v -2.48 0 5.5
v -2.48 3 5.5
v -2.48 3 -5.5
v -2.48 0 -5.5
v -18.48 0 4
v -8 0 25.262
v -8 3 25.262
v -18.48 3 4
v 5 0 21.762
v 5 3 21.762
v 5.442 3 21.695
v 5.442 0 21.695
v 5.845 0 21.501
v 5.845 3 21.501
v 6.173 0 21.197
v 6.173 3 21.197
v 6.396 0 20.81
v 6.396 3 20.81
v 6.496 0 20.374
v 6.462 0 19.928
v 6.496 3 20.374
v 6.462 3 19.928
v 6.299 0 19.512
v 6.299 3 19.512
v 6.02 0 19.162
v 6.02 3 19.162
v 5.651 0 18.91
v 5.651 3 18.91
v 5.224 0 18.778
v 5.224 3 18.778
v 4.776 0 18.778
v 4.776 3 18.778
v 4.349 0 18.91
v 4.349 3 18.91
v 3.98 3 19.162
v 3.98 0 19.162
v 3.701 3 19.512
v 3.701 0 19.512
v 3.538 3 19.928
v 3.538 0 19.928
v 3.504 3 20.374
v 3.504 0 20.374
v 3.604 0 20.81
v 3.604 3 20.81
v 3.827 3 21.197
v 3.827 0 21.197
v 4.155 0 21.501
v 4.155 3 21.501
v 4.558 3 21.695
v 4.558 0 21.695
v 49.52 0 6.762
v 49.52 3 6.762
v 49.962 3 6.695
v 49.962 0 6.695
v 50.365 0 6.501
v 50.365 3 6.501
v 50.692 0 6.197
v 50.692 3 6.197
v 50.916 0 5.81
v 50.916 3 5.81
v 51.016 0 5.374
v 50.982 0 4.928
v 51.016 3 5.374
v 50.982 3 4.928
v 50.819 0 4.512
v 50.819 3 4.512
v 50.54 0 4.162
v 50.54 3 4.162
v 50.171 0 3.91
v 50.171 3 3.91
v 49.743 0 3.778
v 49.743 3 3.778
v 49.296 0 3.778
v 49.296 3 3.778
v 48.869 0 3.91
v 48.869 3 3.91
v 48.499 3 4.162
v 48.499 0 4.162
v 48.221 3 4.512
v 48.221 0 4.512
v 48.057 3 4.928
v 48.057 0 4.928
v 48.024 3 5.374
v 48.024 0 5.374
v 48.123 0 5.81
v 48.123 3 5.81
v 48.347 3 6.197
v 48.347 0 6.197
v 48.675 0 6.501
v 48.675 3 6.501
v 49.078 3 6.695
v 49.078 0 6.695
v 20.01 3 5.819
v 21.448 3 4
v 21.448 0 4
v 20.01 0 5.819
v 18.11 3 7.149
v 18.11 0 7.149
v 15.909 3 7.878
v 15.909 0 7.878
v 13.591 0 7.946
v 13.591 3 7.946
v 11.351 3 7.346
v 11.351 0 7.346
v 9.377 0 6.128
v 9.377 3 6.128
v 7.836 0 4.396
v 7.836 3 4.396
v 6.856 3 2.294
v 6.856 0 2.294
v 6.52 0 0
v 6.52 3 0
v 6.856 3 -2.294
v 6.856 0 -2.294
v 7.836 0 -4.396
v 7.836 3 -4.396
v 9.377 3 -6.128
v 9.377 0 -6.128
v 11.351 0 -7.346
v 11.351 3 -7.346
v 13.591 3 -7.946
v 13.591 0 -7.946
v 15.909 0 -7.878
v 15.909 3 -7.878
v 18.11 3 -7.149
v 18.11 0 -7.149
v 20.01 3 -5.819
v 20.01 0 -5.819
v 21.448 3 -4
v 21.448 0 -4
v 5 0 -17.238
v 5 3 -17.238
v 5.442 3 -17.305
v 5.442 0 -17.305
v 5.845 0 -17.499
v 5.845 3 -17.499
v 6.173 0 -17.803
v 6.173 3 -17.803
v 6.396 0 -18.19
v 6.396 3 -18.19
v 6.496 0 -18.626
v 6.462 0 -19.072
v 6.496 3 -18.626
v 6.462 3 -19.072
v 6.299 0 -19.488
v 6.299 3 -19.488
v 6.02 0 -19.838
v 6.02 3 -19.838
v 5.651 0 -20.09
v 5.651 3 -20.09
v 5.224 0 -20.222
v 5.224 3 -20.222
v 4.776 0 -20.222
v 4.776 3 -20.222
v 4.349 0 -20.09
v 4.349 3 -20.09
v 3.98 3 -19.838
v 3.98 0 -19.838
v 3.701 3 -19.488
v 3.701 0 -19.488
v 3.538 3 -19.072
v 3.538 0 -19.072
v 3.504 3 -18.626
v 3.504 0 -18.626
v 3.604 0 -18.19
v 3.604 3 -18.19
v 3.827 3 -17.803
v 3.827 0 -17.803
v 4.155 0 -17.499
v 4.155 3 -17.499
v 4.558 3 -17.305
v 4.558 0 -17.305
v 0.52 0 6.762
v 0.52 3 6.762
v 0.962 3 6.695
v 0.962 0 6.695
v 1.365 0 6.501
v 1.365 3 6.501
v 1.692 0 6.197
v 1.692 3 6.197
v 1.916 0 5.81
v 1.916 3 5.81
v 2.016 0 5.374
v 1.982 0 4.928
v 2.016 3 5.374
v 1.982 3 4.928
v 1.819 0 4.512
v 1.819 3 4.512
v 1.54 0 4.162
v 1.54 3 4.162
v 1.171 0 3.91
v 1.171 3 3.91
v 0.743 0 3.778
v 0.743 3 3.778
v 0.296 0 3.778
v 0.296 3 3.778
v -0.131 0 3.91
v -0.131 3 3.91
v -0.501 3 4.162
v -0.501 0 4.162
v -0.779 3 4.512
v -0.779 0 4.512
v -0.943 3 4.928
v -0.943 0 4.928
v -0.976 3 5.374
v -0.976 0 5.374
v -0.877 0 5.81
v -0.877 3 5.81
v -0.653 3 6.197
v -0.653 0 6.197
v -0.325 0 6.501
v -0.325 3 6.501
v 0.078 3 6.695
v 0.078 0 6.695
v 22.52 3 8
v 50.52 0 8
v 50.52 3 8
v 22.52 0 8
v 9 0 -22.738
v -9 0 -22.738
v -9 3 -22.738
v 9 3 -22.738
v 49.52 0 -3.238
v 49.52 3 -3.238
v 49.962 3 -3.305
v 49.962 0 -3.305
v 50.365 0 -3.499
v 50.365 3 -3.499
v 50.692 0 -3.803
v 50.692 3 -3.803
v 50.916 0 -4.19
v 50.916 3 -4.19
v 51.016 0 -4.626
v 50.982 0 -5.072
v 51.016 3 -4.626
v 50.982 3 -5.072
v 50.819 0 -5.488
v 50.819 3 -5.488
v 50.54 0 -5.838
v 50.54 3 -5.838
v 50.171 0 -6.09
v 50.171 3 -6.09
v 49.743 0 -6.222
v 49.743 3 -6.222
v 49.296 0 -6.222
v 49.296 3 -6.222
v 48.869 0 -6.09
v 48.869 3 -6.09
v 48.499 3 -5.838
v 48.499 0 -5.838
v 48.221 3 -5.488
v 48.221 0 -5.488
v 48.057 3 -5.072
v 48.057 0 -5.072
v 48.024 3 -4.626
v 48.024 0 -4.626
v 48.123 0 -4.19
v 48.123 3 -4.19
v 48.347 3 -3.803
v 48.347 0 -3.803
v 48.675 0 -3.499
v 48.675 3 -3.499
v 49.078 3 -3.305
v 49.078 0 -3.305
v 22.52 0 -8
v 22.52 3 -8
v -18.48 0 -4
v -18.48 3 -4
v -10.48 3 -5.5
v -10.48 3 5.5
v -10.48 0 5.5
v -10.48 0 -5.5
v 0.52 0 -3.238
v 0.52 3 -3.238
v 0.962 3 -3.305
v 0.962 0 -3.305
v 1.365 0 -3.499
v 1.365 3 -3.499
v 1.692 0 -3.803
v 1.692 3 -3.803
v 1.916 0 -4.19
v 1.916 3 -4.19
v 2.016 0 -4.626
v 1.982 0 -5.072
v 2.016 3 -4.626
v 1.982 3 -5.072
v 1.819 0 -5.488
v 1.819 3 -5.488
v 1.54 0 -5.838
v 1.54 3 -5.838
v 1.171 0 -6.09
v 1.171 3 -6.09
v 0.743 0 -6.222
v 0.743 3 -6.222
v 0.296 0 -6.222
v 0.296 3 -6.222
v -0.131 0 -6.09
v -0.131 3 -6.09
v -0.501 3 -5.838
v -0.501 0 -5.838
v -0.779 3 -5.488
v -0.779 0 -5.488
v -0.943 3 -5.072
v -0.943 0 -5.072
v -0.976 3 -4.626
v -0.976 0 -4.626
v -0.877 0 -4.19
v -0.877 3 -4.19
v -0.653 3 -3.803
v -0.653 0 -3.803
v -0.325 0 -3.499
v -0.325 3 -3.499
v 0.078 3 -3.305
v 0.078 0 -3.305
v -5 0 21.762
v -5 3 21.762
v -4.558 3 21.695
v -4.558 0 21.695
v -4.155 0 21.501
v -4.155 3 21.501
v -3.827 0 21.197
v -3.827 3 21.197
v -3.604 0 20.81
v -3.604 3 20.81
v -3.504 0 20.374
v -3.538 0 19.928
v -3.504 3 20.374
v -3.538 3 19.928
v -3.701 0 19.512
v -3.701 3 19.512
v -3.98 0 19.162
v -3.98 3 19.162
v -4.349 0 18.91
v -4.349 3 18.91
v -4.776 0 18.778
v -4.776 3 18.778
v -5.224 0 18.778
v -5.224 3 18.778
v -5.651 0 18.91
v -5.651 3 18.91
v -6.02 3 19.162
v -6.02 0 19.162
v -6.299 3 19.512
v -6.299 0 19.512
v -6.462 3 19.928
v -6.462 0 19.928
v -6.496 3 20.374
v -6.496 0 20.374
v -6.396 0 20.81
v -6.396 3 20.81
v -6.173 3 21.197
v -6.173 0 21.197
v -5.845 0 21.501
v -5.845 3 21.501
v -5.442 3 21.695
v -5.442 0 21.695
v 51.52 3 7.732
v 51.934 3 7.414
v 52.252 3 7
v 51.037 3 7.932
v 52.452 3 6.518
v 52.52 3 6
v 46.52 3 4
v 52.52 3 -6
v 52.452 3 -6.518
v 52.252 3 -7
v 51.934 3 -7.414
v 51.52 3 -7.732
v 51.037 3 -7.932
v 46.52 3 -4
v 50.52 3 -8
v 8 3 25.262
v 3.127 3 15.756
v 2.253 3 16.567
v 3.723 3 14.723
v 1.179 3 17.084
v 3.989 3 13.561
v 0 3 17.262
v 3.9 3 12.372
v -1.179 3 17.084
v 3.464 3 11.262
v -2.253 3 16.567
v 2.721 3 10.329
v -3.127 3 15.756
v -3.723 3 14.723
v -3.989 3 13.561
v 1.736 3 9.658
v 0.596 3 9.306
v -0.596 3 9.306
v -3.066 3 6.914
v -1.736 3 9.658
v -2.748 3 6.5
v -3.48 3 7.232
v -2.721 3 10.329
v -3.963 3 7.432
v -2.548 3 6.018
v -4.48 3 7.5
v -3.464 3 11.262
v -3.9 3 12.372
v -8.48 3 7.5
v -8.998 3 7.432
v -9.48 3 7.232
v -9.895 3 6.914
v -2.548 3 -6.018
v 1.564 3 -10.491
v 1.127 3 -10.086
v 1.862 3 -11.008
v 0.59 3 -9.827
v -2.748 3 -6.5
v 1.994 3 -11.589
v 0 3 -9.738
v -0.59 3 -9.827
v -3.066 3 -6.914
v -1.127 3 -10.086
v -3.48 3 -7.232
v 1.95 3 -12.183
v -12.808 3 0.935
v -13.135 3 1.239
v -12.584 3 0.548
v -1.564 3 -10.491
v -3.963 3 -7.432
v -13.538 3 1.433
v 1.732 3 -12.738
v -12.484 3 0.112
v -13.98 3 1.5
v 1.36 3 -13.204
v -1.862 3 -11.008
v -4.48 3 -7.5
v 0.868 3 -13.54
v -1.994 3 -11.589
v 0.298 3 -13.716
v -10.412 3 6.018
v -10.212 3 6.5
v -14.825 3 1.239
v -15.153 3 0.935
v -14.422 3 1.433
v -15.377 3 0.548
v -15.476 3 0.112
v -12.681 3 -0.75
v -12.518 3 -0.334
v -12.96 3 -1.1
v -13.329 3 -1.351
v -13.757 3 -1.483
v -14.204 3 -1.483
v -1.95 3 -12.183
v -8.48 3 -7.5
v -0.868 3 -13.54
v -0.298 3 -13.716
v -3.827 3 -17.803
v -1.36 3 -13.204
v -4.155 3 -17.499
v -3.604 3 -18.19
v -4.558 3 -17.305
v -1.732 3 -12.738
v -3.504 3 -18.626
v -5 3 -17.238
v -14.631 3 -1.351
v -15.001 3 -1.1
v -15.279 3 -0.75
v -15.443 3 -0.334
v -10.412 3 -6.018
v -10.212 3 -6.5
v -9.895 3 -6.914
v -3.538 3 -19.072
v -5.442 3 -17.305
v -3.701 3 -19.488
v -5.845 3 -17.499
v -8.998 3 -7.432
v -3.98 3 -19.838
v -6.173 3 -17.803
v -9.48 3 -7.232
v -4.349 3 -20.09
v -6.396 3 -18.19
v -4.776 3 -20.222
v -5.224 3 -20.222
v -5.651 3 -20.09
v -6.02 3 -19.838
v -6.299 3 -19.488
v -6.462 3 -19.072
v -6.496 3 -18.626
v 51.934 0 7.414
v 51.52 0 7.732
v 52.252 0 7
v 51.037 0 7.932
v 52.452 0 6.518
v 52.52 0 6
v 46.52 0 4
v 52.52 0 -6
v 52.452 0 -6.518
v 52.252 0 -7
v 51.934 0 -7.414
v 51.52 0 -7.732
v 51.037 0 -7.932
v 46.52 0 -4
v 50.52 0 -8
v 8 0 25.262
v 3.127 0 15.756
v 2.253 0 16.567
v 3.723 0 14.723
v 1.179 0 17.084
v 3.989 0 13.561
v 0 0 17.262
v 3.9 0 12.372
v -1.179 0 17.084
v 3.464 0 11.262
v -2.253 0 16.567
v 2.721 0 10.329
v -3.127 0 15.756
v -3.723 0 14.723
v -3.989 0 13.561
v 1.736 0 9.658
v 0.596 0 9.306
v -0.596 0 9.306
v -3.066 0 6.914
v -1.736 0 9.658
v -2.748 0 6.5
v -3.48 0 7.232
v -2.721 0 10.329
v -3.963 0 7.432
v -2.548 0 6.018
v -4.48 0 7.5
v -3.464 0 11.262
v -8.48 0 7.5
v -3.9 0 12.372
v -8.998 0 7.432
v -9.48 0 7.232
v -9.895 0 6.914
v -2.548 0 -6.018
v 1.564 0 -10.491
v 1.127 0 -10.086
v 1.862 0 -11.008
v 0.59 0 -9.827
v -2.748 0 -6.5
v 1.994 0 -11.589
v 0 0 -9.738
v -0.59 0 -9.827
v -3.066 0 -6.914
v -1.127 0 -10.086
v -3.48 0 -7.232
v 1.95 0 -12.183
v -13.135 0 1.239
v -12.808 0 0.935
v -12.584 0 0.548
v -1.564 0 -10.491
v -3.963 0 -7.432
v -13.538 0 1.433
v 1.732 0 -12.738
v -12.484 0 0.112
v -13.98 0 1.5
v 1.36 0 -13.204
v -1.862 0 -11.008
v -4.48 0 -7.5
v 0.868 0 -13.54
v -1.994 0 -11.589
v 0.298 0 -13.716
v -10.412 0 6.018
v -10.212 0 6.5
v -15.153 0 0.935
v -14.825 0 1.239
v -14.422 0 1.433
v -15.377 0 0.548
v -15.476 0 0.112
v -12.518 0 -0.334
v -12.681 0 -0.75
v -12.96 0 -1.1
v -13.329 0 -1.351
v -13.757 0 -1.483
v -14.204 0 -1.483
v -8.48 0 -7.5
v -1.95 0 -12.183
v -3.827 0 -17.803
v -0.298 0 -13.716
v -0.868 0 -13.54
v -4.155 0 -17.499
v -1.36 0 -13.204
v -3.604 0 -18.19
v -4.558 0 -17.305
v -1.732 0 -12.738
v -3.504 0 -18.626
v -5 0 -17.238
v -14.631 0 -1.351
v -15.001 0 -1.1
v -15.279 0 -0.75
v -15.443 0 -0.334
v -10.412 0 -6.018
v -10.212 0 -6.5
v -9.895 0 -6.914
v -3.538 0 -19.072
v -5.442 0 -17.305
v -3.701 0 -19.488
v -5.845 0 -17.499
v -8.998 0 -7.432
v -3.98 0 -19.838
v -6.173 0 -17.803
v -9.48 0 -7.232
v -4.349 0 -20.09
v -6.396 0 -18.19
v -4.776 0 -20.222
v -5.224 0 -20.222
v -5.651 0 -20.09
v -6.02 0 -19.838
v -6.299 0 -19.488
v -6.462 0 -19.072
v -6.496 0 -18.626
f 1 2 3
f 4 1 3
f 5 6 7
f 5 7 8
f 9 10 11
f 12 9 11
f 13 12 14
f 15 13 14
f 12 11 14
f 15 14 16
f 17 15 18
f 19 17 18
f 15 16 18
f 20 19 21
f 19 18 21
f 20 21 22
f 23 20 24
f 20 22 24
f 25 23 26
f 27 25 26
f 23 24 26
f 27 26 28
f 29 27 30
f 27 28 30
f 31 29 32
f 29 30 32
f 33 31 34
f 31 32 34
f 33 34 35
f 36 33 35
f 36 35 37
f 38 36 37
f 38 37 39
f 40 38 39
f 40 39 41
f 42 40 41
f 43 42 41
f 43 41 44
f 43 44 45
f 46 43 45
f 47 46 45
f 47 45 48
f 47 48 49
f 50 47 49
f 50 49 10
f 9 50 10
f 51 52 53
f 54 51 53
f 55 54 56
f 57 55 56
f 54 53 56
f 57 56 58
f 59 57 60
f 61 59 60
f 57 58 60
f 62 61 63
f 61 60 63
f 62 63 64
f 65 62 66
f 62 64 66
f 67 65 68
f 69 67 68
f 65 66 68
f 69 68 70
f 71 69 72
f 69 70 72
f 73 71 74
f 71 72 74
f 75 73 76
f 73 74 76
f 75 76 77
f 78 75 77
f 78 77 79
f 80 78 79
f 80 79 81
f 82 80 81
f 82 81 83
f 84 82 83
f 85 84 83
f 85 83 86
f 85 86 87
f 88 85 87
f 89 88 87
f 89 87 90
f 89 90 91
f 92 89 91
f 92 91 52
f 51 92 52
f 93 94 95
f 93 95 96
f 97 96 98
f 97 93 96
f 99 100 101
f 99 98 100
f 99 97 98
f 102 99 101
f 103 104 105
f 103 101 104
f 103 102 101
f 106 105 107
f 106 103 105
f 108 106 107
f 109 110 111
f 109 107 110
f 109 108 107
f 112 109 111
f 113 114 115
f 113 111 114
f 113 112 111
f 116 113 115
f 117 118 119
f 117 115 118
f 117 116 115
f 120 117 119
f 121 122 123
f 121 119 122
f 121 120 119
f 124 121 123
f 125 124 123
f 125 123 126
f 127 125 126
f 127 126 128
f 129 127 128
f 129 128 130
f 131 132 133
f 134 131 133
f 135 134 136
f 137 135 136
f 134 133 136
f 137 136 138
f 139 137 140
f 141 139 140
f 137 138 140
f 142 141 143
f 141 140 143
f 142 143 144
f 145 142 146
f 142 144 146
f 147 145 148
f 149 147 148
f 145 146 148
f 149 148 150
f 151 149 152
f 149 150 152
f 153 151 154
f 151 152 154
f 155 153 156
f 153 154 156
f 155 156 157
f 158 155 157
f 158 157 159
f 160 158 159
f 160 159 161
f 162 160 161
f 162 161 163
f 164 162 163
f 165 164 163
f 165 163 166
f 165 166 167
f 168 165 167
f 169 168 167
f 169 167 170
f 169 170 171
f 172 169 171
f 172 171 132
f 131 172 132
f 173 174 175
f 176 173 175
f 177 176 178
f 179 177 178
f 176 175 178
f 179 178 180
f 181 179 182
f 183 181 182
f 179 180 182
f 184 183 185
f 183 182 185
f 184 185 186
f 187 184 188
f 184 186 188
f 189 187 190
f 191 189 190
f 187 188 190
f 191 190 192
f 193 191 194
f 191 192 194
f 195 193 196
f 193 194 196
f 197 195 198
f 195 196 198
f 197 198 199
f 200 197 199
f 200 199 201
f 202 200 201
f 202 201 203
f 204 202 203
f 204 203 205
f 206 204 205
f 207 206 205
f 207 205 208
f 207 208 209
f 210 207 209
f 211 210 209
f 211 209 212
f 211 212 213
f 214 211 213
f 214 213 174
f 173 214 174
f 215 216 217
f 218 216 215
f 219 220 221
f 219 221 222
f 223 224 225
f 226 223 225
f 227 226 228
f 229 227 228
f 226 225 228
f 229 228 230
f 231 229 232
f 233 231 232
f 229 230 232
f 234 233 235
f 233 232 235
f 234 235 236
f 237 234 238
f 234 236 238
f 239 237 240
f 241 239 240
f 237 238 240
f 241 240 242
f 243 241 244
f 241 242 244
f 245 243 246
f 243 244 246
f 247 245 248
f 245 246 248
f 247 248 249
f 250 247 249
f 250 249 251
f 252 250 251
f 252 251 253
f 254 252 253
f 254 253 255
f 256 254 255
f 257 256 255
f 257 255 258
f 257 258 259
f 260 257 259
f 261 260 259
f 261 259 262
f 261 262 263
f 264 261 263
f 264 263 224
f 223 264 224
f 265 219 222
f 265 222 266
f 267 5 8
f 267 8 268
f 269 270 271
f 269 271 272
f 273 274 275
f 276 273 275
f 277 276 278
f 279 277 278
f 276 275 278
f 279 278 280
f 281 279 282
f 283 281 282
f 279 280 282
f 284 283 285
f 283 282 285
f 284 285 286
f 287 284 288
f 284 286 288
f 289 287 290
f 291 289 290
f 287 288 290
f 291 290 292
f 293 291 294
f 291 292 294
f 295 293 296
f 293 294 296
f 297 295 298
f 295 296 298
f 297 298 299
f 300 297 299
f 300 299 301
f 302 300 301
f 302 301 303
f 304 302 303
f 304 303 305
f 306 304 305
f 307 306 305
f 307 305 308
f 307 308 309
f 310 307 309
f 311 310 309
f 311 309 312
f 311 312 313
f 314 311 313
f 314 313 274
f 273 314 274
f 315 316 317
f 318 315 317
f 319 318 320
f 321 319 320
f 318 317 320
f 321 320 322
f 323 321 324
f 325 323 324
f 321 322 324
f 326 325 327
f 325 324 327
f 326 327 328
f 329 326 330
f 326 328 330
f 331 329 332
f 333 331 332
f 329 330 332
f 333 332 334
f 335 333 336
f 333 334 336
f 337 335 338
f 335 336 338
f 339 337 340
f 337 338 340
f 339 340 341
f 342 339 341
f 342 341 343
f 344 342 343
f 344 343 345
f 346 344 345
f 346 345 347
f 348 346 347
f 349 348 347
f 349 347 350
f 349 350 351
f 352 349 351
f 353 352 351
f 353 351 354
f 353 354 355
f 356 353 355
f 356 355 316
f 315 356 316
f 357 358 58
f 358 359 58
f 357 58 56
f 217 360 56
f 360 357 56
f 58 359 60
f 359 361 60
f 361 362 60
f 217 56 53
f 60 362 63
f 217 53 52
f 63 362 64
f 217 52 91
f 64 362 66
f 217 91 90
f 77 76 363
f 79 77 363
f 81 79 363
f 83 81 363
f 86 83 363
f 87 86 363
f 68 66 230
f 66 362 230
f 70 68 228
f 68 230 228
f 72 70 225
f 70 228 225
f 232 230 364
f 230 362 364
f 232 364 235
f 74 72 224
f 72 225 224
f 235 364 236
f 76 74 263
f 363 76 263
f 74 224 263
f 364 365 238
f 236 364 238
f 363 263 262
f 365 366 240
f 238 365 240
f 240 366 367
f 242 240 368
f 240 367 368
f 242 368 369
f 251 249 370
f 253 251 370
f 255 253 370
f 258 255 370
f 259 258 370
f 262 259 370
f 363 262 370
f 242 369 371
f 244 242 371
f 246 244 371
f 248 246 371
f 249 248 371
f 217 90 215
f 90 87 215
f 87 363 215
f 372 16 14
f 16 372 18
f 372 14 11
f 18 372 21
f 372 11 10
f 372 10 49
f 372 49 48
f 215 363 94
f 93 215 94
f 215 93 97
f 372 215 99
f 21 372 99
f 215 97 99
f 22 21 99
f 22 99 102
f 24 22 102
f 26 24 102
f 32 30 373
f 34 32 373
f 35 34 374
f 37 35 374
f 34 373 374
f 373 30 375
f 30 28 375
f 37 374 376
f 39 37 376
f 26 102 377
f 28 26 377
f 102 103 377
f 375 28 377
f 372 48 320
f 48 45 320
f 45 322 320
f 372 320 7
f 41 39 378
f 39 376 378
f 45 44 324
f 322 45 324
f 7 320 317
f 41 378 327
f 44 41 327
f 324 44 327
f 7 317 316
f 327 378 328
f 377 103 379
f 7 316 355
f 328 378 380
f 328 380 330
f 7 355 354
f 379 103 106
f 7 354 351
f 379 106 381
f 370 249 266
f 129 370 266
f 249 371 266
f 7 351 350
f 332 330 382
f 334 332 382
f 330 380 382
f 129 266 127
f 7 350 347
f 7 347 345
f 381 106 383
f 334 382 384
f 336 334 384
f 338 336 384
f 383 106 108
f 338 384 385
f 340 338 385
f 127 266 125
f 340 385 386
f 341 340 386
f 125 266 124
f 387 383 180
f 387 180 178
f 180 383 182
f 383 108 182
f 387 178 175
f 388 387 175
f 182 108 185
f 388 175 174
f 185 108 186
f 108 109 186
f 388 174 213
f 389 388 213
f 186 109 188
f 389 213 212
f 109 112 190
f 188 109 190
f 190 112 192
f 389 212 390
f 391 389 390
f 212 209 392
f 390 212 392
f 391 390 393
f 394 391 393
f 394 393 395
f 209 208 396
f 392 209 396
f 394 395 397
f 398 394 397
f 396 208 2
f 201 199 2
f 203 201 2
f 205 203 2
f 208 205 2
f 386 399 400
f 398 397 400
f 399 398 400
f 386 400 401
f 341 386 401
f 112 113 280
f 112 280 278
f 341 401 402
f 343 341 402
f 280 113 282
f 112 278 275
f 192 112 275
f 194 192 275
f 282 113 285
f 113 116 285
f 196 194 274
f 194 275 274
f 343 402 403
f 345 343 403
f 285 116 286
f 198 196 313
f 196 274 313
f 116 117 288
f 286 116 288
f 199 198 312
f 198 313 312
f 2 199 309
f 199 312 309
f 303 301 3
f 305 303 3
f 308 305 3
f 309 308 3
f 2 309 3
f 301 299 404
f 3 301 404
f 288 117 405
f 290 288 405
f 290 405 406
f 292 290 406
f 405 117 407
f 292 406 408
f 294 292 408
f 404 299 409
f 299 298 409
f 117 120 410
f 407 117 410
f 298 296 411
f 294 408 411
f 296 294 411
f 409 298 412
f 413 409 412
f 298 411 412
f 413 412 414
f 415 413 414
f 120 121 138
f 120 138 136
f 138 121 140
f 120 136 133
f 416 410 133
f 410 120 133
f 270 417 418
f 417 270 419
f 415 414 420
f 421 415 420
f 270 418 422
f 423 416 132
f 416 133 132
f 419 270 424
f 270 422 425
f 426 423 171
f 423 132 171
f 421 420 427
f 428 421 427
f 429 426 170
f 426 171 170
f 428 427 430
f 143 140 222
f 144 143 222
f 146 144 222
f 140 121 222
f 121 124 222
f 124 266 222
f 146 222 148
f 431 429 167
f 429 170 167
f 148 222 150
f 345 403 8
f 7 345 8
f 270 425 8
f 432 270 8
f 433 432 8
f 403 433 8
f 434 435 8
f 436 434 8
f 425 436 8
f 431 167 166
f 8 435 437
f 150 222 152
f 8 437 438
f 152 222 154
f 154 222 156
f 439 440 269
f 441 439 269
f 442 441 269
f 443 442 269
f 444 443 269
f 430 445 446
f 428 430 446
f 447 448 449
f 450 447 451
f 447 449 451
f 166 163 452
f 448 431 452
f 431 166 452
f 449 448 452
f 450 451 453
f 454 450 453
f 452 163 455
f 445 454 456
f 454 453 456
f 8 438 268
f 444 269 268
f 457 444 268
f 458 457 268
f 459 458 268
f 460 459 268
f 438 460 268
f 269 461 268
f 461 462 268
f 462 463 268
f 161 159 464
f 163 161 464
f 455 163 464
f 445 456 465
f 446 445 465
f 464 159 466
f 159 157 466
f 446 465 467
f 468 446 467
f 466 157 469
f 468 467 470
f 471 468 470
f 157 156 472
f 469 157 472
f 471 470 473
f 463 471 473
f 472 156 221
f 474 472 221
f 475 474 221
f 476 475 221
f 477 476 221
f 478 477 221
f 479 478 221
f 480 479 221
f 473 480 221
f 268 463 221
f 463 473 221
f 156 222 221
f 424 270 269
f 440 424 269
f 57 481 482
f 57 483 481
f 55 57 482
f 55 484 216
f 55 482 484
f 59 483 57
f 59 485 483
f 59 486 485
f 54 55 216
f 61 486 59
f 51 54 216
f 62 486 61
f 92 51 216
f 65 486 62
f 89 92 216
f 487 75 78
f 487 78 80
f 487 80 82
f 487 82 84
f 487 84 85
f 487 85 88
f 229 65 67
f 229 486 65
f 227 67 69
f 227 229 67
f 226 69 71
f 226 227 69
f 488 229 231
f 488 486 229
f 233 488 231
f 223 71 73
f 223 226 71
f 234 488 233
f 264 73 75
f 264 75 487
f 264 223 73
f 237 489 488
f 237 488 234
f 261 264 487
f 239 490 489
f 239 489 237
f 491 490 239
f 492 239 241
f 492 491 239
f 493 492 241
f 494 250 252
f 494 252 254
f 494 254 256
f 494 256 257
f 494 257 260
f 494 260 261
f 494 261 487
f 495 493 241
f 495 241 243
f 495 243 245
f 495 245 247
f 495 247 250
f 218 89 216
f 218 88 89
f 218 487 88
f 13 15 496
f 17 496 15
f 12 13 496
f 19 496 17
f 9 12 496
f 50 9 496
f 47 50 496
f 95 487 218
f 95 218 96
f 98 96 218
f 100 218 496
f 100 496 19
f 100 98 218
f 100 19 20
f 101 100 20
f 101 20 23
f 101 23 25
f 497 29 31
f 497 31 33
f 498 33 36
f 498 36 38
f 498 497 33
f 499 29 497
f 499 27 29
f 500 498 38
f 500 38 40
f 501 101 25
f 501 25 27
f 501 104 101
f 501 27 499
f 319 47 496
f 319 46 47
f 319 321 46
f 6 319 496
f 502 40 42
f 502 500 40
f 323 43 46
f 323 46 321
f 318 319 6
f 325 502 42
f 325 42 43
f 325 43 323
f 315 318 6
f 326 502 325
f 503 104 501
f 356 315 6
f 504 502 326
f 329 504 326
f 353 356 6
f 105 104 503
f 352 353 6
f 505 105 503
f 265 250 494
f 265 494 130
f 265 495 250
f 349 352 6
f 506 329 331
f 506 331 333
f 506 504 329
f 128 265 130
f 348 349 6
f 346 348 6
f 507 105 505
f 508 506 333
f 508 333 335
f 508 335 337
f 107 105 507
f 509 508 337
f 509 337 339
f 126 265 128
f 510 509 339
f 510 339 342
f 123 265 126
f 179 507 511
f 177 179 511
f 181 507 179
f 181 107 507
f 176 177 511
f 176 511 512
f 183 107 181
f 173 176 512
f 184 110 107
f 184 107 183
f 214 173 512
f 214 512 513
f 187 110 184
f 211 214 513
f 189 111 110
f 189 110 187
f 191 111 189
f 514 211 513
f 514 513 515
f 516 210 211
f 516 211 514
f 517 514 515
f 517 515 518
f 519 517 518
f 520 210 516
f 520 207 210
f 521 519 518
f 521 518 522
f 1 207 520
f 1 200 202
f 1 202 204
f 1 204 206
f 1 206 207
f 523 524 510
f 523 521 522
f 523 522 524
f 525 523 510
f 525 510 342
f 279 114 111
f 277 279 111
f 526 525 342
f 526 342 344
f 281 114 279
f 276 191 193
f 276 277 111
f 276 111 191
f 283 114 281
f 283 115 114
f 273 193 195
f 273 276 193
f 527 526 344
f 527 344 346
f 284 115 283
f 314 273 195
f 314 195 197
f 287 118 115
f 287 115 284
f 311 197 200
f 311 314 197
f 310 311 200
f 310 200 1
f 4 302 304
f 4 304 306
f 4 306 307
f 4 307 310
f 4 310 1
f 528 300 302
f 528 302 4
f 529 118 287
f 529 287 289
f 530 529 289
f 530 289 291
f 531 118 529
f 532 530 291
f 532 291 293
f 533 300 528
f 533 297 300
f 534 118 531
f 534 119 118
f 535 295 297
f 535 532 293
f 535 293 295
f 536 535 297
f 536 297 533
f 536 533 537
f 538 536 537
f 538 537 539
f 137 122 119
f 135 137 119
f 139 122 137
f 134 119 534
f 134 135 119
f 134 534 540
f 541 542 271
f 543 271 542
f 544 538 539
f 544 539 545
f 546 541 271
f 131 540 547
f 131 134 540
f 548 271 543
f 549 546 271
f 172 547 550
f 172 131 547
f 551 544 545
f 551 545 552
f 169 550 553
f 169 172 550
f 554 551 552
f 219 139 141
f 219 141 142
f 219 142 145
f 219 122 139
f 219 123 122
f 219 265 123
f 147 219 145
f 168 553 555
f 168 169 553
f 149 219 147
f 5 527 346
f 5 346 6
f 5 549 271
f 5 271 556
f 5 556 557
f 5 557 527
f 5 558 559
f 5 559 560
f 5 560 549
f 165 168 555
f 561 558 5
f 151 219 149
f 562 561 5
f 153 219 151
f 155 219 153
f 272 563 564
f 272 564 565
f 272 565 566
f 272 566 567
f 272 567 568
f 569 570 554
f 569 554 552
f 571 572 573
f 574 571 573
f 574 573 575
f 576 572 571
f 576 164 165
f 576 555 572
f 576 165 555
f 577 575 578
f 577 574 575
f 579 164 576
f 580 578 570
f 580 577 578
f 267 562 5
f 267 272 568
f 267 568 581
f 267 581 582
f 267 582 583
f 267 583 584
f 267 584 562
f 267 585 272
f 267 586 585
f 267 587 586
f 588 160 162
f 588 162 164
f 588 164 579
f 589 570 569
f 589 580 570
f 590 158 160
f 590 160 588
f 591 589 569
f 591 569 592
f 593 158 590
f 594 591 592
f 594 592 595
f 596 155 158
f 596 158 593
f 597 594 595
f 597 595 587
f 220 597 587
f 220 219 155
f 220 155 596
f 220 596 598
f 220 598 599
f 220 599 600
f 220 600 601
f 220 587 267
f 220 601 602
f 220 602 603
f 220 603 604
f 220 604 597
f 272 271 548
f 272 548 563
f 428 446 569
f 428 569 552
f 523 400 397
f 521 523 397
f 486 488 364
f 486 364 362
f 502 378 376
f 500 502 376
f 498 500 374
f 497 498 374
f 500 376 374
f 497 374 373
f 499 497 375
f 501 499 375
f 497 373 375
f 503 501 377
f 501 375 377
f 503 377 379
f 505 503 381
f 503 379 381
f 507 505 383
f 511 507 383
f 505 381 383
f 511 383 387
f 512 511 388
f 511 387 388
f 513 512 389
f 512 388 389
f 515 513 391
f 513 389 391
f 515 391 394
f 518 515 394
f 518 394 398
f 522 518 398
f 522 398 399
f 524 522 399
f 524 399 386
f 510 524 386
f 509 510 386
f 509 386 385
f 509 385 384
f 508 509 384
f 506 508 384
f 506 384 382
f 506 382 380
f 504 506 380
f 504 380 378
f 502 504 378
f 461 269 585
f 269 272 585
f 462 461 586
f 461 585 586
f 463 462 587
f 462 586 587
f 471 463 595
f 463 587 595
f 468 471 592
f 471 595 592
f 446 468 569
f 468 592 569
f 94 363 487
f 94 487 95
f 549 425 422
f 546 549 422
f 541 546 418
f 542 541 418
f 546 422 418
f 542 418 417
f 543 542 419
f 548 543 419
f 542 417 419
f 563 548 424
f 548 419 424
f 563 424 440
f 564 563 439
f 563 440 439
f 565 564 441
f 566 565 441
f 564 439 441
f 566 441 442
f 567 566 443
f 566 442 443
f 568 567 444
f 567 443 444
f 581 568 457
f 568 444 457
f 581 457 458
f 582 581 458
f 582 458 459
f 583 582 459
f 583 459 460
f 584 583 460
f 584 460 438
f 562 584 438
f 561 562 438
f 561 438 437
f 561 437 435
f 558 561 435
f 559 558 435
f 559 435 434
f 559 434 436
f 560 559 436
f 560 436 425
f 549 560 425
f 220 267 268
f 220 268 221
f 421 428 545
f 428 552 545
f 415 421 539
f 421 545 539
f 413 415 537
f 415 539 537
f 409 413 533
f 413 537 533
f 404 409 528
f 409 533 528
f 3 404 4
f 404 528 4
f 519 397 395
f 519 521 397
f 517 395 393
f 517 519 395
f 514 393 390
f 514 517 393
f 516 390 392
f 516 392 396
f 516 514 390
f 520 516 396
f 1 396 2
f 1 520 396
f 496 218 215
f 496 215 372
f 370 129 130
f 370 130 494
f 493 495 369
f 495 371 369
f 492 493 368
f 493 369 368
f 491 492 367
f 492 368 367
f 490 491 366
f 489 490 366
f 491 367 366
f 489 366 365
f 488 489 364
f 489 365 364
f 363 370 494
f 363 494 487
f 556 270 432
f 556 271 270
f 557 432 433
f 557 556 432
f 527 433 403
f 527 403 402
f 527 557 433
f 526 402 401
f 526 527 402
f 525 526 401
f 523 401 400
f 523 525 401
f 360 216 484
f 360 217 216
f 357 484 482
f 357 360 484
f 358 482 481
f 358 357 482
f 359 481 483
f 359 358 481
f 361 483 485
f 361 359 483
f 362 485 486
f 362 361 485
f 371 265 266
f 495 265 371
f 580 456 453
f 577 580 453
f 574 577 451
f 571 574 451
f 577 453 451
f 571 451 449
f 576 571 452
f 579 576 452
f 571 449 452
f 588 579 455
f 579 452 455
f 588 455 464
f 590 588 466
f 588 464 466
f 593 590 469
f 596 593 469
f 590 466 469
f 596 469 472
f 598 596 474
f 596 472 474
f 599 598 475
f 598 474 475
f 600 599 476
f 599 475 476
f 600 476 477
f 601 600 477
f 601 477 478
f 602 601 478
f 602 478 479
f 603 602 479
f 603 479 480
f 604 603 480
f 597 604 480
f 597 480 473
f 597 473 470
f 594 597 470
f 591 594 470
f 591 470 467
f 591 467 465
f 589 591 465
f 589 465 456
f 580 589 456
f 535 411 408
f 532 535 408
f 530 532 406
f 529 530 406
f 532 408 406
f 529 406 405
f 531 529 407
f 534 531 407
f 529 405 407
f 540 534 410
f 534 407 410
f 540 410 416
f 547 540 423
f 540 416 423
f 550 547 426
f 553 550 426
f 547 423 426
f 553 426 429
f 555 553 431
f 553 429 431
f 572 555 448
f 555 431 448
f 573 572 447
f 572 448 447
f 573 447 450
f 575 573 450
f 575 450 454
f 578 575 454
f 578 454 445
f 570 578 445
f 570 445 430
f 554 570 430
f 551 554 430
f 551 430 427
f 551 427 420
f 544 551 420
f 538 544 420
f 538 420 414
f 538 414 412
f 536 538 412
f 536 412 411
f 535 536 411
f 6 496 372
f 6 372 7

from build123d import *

# Parameters (mm, degrees)
BASE_FLANGE1_DEPTH = 3
CUT_EXTRUDE1_REACH = 60.356
CUT_EXTRUDE2_REACH = 60.356
SKETCH3_R          = 1.5
SKETCH3_W          = 8
SKETCH3_H          = 15
CUT_EXTRUDE3_REACH = 60.356
SKETCH4_R          = 1.5
CUT_EXTRUDE4_REACH = 60.356
SKETCH5_R          = 2
SKETCH5_R_2        = 4
FILLET1_R          = 2


# Sheet-metal steps are written as plain solids
with BuildPart() as part:
    # Sketch1 → Base-Flange1 (new body)
    with BuildSketch(Plane(origin=(0, 0, 0), x_dir=(1, 0, 0), z_dir=(0, 1, 0))):
        Polygon((-18.480295105, -4), (-18.480295105, 4), (-9, 22.738303144), (9, 22.738303144), (22.519704895, 8), (52.519704895, 8), (52.519704895, -8), (22.519704895, -8), (8, -25.261696856), (-8, -25.261696856), align=None)
    extrude(amount=BASE_FLANGE1_DEPTH)

    # Sketch2 → Cut-Extrude1 (cut, up to next)
    with BuildSketch(Plane(origin=(0, 3, 0), x_dir=(1, 0, 0), z_dir=(0, 1, 0)), mode=Mode.PRIVATE) as cut_extrude1_sk1:
        with BuildLine():
            Line((21.447908125, 4), (46.519704895, 4))
            Line((46.519704895, 4), (46.519704895, -4))
            Line((46.519704895, -4), (21.447908125, -4))
            ThreePointArc((21.447908125, -4), (6.519704895, 0), (21.447908125, 4))
        make_face()
    cut_extrude1_tool1 = extrude(cut_extrude1_sk1.sketch, amount=-CUT_EXTRUDE1_REACH, mode=Mode.PRIVATE) & part.part
    add(cut_extrude1_tool1.solids().sort_by_distance((24.274518, 3, 0))[0], mode=Mode.SUBTRACT)

    # Sketch3 → Cut-Extrude2 (cut, up to next)
    with BuildSketch(Plane(origin=(0, 3, 0), x_dir=(1, 0, 0), z_dir=(0, 1, 0)), mode=Mode.PRIVATE) as cut_extrude2_sk1:
        with Locations(Location((-13.980295105, 0, 0), (0, 0, 270))):
            Circle(SKETCH3_R)
    cut_extrude2_tool1 = extrude(cut_extrude2_sk1.sketch, amount=-CUT_EXTRUDE2_REACH, mode=Mode.PRIVATE) & part.part
    # Sketch3 → Cut-Extrude2 (cut, up to next)
    with BuildSketch(Plane(origin=(0, 3, 0), x_dir=(1, 0, 0), z_dir=(0, 1, 0)), mode=Mode.PRIVATE) as cut_extrude2_sk2:
        with Locations((-6.480295105, 0)):
            Rectangle(SKETCH3_W, SKETCH3_H)
    cut_extrude2_tool2 = extrude(cut_extrude2_sk2.sketch, amount=-CUT_EXTRUDE2_REACH, mode=Mode.PRIVATE) & part.part
    add(cut_extrude2_tool1.solids().sort_by_distance((-13.980295, 3, 0))[0], mode=Mode.SUBTRACT)
    add(cut_extrude2_tool2.solids().sort_by_distance((-6.480295, 3, 0))[0], mode=Mode.SUBTRACT)

    # Sketch4 → Cut-Extrude3 (cut, up to next)
    with BuildSketch(Plane(origin=(0, 3, 0), x_dir=(1, 0, 0), z_dir=(0, 1, 0)), mode=Mode.PRIVATE) as cut_extrude3_sk1:
        with Locations(Location((-5, 18.738303144, 0), (0, 0, 270))):
            Circle(SKETCH4_R)
    cut_extrude3_tool1 = extrude(cut_extrude3_sk1.sketch, amount=-CUT_EXTRUDE3_REACH, mode=Mode.PRIVATE) & part.part
    # Sketch4 → Cut-Extrude3 (cut, up to next)
    with BuildSketch(Plane(origin=(0, 3, 0), x_dir=(1, 0, 0), z_dir=(0, 1, 0)), mode=Mode.PRIVATE) as cut_extrude3_sk2:
        with Locations(Location((5, 18.738303144, 0), (0, 0, 270))):
            Circle(SKETCH4_R)
    cut_extrude3_tool2 = extrude(cut_extrude3_sk2.sketch, amount=-CUT_EXTRUDE3_REACH, mode=Mode.PRIVATE) & part.part
    # Sketch4 → Cut-Extrude3 (cut, up to next)
    with BuildSketch(Plane(origin=(0, 3, 0), x_dir=(1, 0, 0), z_dir=(0, 1, 0)), mode=Mode.PRIVATE) as cut_extrude3_sk3:
        with Locations(Location((0.519704895, 4.738303144, 0), (0, 0, 270))):
            Circle(SKETCH4_R)
    cut_extrude3_tool3 = extrude(cut_extrude3_sk3.sketch, amount=-CUT_EXTRUDE3_REACH, mode=Mode.PRIVATE) & part.part
    # Sketch4 → Cut-Extrude3 (cut, up to next)
    with BuildSketch(Plane(origin=(0, 3, 0), x_dir=(1, 0, 0), z_dir=(0, 1, 0)), mode=Mode.PRIVATE) as cut_extrude3_sk4:
        with Locations(Location((-5, -20.261696856, 0), (0, 0, 270))):
            Circle(SKETCH4_R)
    cut_extrude3_tool4 = extrude(cut_extrude3_sk4.sketch, amount=-CUT_EXTRUDE3_REACH, mode=Mode.PRIVATE) & part.part
    # Sketch4 → Cut-Extrude3 (cut, up to next)
    with BuildSketch(Plane(origin=(0, 3, 0), x_dir=(1, 0, 0), z_dir=(0, 1, 0)), mode=Mode.PRIVATE) as cut_extrude3_sk5:
        with Locations(Location((5, -20.261696856, 0), (0, 0, 270))):
            Circle(SKETCH4_R)
    cut_extrude3_tool5 = extrude(cut_extrude3_sk5.sketch, amount=-CUT_EXTRUDE3_REACH, mode=Mode.PRIVATE) & part.part
    # Sketch4 → Cut-Extrude3 (cut, up to next)
    with BuildSketch(Plane(origin=(0, 3, 0), x_dir=(1, 0, 0), z_dir=(0, 1, 0)), mode=Mode.PRIVATE) as cut_extrude3_sk6:
        with Locations(Location((0.519704895, -5.261696856, 0), (0, 0, 270))):
            Circle(SKETCH4_R)
    cut_extrude3_tool6 = extrude(cut_extrude3_sk6.sketch, amount=-CUT_EXTRUDE3_REACH, mode=Mode.PRIVATE) & part.part
    # Sketch4 → Cut-Extrude3 (cut, up to next)
    with BuildSketch(Plane(origin=(0, 3, 0), x_dir=(1, 0, 0), z_dir=(0, 1, 0)), mode=Mode.PRIVATE) as cut_extrude3_sk7:
        with Locations(Location((49.519704895, 4.738303144, 0), (0, 0, 270))):
            Circle(SKETCH4_R)
    cut_extrude3_tool7 = extrude(cut_extrude3_sk7.sketch, amount=-CUT_EXTRUDE3_REACH, mode=Mode.PRIVATE) & part.part
    # Sketch4 → Cut-Extrude3 (cut, up to next)
    with BuildSketch(Plane(origin=(0, 3, 0), x_dir=(1, 0, 0), z_dir=(0, 1, 0)), mode=Mode.PRIVATE) as cut_extrude3_sk8:
        with Locations(Location((49.519704895, -5.261696856, 0), (0, 0, 270))):
            Circle(SKETCH4_R)
    cut_extrude3_tool8 = extrude(cut_extrude3_sk8.sketch, amount=-CUT_EXTRUDE3_REACH, mode=Mode.PRIVATE) & part.part
    add(cut_extrude3_tool1.solids().sort_by_distance((-5, 3, -18.738303))[0], mode=Mode.SUBTRACT)
    add(cut_extrude3_tool2.solids().sort_by_distance((5, 3, -18.738303))[0], mode=Mode.SUBTRACT)
    add(cut_extrude3_tool3.solids().sort_by_distance((0.519705, 3, -4.738303))[0], mode=Mode.SUBTRACT)
    add(cut_extrude3_tool4.solids().sort_by_distance((-5, 3, 20.261697))[0], mode=Mode.SUBTRACT)
    add(cut_extrude3_tool5.solids().sort_by_distance((5, 3, 20.261697))[0], mode=Mode.SUBTRACT)
    add(cut_extrude3_tool6.solids().sort_by_distance((0.519705, 3, 5.261697))[0], mode=Mode.SUBTRACT)
    add(cut_extrude3_tool7.solids().sort_by_distance((49.519705, 3, -4.738303))[0], mode=Mode.SUBTRACT)
    add(cut_extrude3_tool8.solids().sort_by_distance((49.519705, 3, 5.261697))[0], mode=Mode.SUBTRACT)

    # Sketch5 → Cut-Extrude4 (cut, up to next)
    with BuildSketch(Plane(origin=(0, 3, 0), x_dir=(1, 0, 0), z_dir=(0, 1, 0)), mode=Mode.PRIVATE) as cut_extrude4_sk1:
        with Locations(Location((0, 11.738303144, 0), (0, 0, 270))):
            Circle(SKETCH5_R)
    cut_extrude4_tool1 = extrude(cut_extrude4_sk1.sketch, amount=-CUT_EXTRUDE4_REACH, mode=Mode.PRIVATE) & part.part
    # Sketch5 → Cut-Extrude4 (cut, up to next)
    with BuildSketch(Plane(origin=(0, 3, 0), x_dir=(1, 0, 0), z_dir=(0, 1, 0)), mode=Mode.PRIVATE) as cut_extrude4_sk2:
        with Locations(Location((0, -13.261696856, 0), (0, 0, 270))):
            Circle(SKETCH5_R_2)
    cut_extrude4_tool2 = extrude(cut_extrude4_sk2.sketch, amount=-CUT_EXTRUDE4_REACH, mode=Mode.PRIVATE) & part.part
    add(cut_extrude4_tool1.solids().sort_by_distance((0, 3, -11.738303))[0], mode=Mode.SUBTRACT)
    add(cut_extrude4_tool2.solids().sort_by_distance((0, 3, 13.261697))[0], mode=Mode.SUBTRACT)

    # Fillet1
    fillet1_edges = [part.edges().sort_by_distance(p)[0] for p in [
        (52.519704895, 1.5, -8),
        (52.519704895, 1.5, 8),
        (-2.480295105, 1.5, -7.5),
        (-2.480295105, 1.5, 7.5),
        (-10.480295105, 1.5, 7.5),
        (-10.480295105, 1.5, -7.5),
    ]]
    fillet(fillet1_edges, radius=FILLET1_R)


solid = part.part
